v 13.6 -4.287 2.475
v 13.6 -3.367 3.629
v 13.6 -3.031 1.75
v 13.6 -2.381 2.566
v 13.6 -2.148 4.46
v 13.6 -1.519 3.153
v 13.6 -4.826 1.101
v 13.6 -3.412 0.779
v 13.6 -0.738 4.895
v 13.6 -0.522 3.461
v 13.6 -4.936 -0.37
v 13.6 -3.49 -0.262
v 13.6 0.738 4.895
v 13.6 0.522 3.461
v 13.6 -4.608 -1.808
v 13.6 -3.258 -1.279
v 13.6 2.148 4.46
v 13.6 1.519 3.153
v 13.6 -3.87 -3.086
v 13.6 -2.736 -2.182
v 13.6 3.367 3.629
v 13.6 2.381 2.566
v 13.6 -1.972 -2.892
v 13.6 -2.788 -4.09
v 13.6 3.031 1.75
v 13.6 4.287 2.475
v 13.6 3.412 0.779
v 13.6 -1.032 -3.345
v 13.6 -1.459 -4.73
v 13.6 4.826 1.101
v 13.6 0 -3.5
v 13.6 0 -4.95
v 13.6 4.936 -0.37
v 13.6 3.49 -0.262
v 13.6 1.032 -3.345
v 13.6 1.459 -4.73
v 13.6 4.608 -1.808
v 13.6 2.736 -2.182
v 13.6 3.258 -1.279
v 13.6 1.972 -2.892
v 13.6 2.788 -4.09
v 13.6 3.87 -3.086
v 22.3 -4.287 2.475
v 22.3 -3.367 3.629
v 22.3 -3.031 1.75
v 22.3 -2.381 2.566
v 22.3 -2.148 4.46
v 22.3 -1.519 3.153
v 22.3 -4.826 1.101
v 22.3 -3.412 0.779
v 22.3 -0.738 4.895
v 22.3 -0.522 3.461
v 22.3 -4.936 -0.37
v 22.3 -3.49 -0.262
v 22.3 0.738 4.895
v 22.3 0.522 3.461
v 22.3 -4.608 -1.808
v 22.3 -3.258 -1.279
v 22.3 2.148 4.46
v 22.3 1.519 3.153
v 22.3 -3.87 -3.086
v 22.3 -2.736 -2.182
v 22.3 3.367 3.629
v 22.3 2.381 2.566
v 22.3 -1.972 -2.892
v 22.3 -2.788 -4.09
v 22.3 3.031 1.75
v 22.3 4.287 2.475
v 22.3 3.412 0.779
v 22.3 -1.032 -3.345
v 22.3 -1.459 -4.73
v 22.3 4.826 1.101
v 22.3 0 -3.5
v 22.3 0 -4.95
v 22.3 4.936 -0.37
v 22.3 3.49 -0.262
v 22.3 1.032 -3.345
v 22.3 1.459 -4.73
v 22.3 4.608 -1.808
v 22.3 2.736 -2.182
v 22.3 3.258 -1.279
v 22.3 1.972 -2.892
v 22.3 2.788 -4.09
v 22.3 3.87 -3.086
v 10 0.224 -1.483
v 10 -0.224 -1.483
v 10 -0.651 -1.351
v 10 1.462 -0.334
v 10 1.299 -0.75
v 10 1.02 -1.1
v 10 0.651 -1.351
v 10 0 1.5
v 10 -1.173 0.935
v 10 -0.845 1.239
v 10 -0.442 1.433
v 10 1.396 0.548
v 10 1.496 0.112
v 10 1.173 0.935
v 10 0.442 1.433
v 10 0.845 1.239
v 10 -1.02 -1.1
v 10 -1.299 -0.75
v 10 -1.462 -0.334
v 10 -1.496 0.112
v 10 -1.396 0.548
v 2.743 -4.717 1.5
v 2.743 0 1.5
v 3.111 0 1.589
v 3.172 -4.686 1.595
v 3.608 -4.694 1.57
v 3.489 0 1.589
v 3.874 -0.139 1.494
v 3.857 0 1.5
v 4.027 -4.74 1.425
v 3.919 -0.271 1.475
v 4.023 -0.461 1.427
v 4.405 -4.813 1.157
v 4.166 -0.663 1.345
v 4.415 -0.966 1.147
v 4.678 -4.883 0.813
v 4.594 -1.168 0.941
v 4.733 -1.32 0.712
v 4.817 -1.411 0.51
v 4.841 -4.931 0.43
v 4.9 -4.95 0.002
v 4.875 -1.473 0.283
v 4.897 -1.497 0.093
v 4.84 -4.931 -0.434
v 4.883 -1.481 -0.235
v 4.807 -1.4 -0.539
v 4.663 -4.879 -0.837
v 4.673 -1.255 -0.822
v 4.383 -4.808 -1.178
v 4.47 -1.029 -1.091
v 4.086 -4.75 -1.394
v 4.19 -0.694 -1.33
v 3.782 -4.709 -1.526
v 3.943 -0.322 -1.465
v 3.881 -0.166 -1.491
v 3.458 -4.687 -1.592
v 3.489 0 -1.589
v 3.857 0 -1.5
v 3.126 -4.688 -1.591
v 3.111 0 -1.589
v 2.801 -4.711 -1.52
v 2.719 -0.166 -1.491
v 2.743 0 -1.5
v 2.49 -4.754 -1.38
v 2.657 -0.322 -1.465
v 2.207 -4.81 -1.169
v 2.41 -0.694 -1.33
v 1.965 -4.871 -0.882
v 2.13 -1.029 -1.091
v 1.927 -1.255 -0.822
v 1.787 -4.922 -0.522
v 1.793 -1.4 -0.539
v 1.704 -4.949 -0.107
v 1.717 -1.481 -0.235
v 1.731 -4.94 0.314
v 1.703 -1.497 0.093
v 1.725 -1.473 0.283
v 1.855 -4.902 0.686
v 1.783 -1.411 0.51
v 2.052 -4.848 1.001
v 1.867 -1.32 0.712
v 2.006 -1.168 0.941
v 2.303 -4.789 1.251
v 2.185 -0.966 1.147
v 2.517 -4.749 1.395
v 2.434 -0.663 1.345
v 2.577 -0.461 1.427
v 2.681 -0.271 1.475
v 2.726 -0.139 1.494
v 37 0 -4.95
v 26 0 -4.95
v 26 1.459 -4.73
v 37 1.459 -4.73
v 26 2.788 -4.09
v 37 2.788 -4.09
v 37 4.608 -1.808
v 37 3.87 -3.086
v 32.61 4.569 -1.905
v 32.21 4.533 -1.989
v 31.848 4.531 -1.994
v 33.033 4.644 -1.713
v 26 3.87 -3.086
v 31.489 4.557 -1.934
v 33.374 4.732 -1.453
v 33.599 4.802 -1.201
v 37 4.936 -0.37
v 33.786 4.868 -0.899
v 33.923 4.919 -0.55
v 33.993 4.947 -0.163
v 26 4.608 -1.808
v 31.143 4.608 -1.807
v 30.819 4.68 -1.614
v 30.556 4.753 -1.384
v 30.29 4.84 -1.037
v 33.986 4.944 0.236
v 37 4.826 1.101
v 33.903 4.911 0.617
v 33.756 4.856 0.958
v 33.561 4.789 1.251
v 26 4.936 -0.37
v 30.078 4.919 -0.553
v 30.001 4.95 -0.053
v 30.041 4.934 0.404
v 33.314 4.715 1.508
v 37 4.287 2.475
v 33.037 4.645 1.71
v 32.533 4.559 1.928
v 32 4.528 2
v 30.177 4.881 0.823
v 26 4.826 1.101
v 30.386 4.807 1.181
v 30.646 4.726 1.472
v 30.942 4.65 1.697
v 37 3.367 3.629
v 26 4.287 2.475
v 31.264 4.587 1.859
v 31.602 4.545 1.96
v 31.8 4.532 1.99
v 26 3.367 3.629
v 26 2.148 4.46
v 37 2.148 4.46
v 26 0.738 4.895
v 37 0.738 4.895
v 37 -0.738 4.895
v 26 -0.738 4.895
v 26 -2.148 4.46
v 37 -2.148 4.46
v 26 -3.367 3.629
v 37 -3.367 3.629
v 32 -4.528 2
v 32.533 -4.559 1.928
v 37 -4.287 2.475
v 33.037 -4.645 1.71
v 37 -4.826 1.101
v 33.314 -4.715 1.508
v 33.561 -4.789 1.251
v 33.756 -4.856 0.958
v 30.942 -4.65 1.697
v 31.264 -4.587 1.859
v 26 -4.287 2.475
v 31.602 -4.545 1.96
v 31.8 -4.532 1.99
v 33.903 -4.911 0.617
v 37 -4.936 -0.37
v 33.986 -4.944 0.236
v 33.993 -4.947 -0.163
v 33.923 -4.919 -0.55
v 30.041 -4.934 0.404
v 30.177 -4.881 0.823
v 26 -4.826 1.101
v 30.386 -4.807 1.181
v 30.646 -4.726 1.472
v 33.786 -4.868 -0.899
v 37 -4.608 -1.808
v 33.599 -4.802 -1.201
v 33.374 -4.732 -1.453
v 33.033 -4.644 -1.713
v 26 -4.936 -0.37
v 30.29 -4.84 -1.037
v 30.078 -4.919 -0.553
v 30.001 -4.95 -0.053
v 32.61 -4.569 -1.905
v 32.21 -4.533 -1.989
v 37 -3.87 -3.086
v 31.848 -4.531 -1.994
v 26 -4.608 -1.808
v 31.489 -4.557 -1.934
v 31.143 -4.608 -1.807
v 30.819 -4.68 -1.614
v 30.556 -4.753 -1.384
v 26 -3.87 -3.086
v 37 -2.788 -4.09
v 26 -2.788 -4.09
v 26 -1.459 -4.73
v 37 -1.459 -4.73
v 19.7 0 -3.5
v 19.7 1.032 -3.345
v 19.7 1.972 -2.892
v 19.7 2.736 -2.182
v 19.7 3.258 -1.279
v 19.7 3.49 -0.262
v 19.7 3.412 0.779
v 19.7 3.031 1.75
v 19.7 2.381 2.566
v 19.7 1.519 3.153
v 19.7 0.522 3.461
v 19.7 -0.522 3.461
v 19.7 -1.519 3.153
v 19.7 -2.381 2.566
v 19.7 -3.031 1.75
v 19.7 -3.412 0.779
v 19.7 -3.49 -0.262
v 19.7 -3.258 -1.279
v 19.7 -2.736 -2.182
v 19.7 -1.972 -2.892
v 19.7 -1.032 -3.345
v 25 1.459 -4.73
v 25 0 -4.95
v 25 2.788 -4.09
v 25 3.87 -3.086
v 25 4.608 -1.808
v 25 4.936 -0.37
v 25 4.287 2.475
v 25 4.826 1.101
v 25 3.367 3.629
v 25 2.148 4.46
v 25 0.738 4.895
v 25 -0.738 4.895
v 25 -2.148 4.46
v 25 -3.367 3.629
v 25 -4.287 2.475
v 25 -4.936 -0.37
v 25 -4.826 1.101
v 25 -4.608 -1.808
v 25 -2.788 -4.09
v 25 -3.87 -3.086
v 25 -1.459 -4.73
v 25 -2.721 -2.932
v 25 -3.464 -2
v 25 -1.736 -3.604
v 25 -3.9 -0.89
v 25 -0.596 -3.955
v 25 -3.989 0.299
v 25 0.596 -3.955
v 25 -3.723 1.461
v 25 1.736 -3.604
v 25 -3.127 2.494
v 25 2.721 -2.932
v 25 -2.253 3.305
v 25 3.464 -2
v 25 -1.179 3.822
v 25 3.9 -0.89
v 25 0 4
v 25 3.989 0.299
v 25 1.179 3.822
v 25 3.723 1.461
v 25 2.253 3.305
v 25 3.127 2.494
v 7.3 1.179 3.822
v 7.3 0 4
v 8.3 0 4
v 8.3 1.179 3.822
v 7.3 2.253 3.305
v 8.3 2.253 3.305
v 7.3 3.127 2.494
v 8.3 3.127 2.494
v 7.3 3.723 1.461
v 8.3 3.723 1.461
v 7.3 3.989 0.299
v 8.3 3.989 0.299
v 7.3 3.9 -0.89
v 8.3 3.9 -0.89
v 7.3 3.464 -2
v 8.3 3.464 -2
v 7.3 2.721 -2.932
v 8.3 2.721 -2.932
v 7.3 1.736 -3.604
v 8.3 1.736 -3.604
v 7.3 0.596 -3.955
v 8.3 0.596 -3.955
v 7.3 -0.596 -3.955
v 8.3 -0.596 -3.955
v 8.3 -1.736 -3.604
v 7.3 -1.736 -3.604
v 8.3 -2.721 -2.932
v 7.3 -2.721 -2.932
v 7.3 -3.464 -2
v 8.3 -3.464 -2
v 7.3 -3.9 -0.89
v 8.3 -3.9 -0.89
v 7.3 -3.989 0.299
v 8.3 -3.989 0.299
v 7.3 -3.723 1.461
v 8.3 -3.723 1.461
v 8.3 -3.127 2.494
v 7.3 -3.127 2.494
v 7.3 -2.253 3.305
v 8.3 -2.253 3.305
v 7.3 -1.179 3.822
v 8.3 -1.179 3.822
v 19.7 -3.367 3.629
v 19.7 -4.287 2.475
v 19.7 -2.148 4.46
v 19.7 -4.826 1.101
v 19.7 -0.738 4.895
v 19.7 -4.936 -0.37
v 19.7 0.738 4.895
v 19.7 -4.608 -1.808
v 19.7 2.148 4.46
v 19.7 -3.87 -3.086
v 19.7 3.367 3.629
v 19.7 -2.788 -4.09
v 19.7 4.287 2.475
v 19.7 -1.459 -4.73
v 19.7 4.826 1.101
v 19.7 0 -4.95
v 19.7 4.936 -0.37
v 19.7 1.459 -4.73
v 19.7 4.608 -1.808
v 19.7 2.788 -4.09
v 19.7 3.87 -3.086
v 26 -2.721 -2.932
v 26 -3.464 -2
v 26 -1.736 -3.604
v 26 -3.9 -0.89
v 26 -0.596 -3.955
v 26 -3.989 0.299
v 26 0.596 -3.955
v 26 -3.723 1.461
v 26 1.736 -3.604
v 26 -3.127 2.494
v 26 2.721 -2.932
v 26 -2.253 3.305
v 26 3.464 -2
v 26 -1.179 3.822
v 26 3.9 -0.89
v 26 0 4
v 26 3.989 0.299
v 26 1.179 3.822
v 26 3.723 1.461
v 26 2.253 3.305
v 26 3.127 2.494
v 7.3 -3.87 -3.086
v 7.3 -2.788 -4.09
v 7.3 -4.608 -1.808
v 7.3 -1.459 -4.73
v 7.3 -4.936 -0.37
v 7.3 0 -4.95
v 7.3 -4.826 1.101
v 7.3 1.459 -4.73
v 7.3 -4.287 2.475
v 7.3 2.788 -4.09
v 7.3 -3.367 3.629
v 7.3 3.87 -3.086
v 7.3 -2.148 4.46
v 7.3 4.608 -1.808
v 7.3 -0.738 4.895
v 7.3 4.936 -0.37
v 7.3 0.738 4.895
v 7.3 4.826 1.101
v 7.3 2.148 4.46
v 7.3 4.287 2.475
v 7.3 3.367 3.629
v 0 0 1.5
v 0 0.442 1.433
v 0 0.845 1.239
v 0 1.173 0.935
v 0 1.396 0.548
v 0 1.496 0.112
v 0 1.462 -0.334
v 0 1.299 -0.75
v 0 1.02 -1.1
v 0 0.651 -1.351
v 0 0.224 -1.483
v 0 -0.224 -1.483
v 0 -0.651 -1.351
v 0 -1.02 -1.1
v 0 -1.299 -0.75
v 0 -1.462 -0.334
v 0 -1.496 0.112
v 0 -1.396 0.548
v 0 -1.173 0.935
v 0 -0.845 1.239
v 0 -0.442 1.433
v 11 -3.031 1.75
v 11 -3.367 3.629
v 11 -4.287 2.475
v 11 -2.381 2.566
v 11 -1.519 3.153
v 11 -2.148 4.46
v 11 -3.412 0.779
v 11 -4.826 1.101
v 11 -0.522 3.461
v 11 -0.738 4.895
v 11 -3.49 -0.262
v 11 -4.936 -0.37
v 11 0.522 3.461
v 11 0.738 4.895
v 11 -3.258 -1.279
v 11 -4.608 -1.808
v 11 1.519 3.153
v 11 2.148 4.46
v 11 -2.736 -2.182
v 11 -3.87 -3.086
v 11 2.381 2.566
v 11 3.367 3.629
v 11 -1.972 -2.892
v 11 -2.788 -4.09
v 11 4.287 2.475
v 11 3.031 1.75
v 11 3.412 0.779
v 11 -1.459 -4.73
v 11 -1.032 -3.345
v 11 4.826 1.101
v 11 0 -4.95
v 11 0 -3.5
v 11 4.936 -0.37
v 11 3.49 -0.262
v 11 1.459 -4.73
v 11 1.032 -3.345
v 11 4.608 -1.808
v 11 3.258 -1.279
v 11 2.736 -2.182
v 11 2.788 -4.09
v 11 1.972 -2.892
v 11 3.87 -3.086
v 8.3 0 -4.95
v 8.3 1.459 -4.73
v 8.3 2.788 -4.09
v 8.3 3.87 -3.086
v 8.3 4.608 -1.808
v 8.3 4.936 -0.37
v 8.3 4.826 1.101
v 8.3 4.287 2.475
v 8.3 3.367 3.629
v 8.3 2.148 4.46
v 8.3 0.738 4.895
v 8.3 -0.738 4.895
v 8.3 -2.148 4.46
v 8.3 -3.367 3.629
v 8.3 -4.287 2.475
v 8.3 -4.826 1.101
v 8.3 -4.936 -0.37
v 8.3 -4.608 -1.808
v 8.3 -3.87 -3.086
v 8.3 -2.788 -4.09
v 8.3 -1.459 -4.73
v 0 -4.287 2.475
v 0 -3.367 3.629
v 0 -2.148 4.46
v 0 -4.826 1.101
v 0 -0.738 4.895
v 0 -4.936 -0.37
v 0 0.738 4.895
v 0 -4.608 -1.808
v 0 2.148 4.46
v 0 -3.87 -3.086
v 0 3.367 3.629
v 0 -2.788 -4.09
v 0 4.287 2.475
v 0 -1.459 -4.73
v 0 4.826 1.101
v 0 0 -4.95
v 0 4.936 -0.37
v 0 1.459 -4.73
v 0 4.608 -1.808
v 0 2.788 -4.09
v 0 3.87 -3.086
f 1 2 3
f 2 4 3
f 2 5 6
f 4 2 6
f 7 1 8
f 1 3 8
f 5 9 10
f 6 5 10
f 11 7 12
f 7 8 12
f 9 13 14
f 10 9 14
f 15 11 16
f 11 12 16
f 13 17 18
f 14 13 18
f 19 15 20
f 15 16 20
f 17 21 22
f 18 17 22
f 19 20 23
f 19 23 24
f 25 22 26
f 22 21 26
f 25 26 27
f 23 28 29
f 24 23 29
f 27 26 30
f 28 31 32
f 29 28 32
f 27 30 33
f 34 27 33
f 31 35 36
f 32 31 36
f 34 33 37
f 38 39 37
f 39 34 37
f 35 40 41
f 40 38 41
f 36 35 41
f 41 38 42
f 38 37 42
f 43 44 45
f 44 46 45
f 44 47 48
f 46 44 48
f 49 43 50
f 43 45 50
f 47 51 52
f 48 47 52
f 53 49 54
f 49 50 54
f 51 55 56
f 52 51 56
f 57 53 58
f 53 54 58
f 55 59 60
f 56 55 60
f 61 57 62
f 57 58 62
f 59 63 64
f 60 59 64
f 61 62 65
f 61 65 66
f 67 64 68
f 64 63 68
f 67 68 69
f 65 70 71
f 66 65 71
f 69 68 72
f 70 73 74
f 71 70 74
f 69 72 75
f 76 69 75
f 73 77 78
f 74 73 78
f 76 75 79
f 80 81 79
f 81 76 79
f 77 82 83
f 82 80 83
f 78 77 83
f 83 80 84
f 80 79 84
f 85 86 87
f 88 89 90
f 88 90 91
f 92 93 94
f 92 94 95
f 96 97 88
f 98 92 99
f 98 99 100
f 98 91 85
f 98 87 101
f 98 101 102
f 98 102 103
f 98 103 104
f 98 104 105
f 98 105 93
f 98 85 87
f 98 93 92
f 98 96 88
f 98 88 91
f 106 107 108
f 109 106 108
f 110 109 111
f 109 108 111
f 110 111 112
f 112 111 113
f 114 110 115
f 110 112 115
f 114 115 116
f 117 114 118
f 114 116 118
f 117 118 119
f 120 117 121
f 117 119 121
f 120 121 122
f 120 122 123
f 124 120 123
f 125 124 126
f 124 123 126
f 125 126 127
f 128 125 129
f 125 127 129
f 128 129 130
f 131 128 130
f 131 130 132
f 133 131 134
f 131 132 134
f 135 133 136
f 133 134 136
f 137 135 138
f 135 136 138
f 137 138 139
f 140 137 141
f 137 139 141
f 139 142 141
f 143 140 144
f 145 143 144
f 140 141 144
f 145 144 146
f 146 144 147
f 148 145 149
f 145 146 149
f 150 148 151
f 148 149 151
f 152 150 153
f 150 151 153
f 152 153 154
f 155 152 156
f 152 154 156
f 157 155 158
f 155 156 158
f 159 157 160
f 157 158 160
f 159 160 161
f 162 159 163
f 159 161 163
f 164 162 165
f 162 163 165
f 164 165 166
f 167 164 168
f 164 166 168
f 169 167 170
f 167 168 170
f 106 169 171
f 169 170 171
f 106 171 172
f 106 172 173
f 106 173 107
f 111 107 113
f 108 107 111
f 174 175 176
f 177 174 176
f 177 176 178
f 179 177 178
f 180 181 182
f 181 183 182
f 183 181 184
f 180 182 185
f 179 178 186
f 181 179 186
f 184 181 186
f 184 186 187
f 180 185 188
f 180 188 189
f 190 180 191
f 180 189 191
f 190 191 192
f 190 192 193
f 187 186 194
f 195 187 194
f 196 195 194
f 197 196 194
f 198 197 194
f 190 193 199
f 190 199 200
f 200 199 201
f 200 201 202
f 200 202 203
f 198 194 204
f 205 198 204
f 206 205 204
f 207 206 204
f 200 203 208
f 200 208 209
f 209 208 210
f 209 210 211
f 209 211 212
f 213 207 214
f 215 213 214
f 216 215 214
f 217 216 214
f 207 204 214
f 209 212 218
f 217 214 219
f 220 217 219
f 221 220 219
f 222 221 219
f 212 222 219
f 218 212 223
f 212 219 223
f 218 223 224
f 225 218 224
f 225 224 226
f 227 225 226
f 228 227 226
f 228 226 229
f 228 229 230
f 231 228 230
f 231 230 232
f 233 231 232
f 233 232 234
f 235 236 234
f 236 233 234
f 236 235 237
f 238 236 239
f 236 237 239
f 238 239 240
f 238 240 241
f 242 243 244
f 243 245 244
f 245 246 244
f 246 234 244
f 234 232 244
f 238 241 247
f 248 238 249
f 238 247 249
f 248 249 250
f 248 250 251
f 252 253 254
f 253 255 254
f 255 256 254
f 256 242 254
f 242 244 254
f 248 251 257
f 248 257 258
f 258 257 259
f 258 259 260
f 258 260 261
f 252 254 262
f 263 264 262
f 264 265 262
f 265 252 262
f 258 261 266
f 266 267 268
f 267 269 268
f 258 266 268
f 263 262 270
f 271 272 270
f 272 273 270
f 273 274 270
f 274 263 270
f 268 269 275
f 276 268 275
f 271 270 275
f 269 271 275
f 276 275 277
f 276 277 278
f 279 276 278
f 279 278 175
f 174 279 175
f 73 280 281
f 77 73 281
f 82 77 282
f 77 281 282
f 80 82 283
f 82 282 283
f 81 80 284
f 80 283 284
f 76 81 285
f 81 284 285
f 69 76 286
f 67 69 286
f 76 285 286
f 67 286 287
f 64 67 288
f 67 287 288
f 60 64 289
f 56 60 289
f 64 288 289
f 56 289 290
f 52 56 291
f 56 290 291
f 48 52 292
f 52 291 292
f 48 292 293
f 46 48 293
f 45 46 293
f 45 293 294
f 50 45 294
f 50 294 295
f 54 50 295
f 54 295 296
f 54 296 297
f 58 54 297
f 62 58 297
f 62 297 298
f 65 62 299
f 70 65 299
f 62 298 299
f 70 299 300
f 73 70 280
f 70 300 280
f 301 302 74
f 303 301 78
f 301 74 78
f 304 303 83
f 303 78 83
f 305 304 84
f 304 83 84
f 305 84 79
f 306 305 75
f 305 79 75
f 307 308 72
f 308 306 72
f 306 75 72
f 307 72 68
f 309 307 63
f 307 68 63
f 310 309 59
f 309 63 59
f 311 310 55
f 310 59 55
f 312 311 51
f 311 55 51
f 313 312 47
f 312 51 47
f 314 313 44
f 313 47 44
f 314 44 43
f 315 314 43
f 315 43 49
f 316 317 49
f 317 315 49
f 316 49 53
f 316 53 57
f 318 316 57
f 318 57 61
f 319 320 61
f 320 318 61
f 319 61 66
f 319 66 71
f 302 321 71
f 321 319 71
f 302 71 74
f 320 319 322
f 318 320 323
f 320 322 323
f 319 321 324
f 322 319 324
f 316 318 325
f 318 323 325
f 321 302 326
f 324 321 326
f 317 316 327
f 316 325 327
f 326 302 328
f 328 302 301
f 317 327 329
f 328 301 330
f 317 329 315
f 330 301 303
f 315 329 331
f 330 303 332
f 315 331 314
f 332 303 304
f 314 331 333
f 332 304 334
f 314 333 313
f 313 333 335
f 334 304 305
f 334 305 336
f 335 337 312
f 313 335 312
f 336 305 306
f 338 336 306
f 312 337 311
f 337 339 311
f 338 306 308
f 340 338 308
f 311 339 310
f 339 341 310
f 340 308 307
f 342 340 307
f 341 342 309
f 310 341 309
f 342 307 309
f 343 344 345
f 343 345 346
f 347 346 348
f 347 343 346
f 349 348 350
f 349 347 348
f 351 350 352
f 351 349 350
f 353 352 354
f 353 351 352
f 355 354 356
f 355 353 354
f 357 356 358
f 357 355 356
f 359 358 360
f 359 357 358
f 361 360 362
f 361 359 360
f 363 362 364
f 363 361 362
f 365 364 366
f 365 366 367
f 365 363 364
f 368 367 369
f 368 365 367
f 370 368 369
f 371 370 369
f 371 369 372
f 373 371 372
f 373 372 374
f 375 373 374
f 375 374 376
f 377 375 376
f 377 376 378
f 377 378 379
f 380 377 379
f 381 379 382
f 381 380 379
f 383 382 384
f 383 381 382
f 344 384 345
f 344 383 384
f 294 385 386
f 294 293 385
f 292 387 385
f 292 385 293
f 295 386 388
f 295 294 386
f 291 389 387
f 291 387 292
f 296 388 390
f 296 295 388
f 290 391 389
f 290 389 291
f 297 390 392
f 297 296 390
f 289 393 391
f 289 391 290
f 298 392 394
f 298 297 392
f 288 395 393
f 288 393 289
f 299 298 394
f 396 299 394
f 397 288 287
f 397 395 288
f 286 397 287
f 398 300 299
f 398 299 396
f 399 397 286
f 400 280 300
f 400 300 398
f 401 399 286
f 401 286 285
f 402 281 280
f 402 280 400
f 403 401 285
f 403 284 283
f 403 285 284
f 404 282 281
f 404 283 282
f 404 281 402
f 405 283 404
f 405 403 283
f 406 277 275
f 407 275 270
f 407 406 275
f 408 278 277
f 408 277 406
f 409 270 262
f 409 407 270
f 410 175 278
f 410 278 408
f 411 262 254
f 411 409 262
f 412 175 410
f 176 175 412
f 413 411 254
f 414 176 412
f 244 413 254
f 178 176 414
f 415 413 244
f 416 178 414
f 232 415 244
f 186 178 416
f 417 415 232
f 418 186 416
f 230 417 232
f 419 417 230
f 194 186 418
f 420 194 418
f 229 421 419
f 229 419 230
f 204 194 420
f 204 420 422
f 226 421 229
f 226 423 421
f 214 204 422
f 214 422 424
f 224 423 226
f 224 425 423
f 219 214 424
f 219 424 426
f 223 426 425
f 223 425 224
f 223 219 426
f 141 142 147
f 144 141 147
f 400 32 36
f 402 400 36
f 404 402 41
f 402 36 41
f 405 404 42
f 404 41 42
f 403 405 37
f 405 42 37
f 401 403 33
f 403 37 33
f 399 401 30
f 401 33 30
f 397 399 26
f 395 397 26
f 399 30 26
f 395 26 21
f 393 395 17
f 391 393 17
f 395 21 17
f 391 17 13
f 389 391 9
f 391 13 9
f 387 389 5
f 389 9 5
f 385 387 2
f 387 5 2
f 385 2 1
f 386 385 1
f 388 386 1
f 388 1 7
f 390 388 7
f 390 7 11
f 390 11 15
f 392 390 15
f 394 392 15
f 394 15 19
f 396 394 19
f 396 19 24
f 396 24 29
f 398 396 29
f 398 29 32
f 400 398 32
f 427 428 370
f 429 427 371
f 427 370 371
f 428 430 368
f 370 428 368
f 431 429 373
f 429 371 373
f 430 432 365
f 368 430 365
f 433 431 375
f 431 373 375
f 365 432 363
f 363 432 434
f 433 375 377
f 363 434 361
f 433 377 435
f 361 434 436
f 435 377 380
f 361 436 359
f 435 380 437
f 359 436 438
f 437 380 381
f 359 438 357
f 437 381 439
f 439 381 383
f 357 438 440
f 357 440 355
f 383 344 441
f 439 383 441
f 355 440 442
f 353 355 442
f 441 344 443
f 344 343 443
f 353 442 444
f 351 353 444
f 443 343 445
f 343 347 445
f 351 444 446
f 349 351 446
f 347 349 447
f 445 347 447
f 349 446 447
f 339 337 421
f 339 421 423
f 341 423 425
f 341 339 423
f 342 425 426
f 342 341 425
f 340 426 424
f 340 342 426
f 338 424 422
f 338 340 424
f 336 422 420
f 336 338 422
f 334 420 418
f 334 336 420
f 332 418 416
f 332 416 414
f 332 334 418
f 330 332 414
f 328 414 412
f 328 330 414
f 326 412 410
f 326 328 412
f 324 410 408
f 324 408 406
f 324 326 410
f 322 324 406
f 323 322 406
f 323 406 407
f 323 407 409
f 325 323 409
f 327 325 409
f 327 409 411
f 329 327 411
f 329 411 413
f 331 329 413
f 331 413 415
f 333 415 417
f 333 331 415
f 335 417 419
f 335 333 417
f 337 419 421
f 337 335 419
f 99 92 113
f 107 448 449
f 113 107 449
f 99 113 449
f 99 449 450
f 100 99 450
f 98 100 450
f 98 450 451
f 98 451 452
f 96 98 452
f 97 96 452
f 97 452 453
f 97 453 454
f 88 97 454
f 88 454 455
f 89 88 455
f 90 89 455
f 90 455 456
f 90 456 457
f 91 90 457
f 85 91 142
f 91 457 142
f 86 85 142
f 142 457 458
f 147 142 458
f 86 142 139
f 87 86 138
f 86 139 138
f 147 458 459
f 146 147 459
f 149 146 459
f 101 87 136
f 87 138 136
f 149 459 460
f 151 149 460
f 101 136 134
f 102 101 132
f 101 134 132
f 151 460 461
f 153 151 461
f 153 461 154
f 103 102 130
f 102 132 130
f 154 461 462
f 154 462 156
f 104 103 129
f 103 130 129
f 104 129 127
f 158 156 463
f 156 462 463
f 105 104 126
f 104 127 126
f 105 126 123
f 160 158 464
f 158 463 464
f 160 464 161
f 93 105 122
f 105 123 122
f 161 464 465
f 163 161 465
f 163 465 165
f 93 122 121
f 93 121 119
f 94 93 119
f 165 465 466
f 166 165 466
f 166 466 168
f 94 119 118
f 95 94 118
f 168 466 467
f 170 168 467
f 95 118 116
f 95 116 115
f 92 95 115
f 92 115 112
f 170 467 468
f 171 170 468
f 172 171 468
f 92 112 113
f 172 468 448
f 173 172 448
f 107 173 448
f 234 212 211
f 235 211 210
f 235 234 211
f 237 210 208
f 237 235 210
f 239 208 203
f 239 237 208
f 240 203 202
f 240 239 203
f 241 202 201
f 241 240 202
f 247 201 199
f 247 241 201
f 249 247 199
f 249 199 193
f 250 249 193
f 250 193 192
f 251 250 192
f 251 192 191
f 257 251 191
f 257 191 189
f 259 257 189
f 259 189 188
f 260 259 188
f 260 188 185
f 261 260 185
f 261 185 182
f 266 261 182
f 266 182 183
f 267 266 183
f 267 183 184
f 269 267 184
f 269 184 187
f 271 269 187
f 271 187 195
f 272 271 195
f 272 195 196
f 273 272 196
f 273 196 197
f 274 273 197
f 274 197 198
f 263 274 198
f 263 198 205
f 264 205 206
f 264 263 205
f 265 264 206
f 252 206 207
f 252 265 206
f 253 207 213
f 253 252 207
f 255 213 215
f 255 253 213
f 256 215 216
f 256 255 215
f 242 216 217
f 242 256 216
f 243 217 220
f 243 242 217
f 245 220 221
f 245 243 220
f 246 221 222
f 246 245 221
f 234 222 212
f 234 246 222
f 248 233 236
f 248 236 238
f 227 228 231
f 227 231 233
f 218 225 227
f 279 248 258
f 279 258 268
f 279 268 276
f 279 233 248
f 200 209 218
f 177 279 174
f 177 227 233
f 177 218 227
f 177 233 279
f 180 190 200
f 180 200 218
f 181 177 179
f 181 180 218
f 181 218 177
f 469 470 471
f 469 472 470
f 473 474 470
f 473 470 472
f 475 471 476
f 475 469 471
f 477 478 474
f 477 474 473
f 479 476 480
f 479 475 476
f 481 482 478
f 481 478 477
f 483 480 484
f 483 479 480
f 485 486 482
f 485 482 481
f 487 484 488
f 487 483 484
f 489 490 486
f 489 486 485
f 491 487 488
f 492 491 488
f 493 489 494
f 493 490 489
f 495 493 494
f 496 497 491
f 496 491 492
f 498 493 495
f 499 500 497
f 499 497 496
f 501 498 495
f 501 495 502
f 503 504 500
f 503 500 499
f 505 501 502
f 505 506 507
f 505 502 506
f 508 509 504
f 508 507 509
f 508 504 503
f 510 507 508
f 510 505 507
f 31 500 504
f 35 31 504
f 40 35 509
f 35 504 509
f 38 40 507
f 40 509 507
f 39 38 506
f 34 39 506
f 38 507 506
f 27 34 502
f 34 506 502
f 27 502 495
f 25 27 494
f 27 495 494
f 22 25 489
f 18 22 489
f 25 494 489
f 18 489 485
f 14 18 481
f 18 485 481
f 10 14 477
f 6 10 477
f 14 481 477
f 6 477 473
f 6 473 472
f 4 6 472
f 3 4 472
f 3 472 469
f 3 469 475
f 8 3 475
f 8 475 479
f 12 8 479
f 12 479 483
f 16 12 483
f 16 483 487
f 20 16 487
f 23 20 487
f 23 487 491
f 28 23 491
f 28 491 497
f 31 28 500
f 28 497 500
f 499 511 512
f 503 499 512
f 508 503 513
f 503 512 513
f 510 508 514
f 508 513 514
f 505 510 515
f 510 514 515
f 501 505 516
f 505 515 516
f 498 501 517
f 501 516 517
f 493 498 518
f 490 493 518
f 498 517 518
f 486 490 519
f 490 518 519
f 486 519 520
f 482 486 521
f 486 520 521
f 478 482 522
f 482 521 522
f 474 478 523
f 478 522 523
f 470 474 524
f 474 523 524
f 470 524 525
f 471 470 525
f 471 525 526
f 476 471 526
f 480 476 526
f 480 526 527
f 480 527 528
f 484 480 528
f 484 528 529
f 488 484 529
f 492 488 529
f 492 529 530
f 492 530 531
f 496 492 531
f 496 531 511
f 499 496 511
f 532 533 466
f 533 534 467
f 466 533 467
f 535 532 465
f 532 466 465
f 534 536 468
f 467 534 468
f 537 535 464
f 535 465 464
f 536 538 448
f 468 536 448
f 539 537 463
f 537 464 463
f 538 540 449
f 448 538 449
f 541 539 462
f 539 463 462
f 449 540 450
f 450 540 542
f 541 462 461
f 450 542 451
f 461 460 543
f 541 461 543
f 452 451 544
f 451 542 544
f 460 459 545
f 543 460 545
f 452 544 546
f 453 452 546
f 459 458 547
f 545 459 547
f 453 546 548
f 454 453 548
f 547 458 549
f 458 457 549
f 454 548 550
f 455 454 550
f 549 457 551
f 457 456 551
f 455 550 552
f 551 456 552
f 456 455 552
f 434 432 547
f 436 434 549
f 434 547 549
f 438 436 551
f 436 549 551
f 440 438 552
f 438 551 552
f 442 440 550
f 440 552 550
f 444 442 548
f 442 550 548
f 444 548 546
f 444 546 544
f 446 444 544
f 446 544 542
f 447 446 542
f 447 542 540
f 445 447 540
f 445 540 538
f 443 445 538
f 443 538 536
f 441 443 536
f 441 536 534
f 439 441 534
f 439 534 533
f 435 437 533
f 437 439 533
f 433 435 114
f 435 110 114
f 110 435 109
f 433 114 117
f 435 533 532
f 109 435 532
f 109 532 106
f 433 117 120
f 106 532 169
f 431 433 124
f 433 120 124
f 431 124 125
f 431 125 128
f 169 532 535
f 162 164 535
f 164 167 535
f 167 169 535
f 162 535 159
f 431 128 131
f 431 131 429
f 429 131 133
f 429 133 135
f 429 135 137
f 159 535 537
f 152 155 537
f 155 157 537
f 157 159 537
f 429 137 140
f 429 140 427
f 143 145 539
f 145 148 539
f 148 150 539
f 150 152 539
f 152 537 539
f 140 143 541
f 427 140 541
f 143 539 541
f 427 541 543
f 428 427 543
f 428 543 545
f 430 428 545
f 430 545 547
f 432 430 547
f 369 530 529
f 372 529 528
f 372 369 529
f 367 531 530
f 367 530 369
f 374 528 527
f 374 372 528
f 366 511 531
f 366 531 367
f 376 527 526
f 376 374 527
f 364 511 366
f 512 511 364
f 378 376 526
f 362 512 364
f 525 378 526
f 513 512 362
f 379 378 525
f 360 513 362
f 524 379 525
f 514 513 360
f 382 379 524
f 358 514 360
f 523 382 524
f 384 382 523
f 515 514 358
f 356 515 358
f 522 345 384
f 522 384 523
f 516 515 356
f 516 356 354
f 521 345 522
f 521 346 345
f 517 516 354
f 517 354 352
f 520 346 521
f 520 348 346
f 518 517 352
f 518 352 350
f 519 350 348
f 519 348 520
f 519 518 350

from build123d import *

# Parameters (mm, degrees)
SKETCH_1_R               = 4.95
EXTRUDE_1_DEPTH          = 37
CUT_EXTRUDE_START        = 11
SKETCH_1_3_R             = 4.95
SKETCH_1_3_R_2           = 3.5
CUT_EXTRUDE_1_DEPTH      = 2.6
CUT_EXTRUDE_START_2      = 19.7
SKETCH_1_4_R             = 4.95
SKETCH_1_4_R_2           = 3.5
CUT_EXTRUDE_2_DEPTH      = 2.6
SKETCH_2_R               = 1.5
CUT_EXTRUDE_3_DEPTH      = 10
SKETCH_3_R               = 1.6
CUT_EXTRUDE_4_DEPTH      = 38.656407157
CUT_EXTRUDE_START_3      = -7.3
SKETCH_4_R               = 4.95
SKETCH_4_R_2             = 4
CUT_EXTRUDE_5_DEPTH      = 1
CUT_EXTRUDE_START_4      = -25
SKETCH_4_2_R             = 4.95
SKETCH_4_2_R_2           = 4
CUT_EXTRUDE_6_DEPTH      = 1
CUT_EXTRUDE_7_DEPTH      = 38.656407184
CUT_EXTRUDE_7_DEPTH_BACK = 38.656407184
SKETCH_5_R               = 2


with BuildPart() as part:
    # Эскиз1 → Бобышка-Вытянуть1 (new body)
    with BuildSketch(Plane(origin=(0, 0, 0), x_dir=(0, 0, -1), z_dir=(1, 0, 0))):
        Circle(SKETCH_1_R)
    extrude(amount=EXTRUDE_1_DEPTH)

    # Эскиз1<3> → Вырез-Вытянуть1 (cut)
    with BuildSketch(Plane(origin=(0, 0, 0), x_dir=(0, 0, -1), z_dir=(1, 0, 0)).offset(CUT_EXTRUDE_START)):
        Circle(SKETCH_1_3_R)
        Circle(SKETCH_1_3_R_2, mode=Mode.SUBTRACT)
    extrude(amount=CUT_EXTRUDE_1_DEPTH, mode=Mode.SUBTRACT)

    # Эскиз1<4> → Вырез-Вытянуть2 (cut)
    with BuildSketch(Plane(origin=(0, 0, 0), x_dir=(0, 0, -1), z_dir=(1, 0, 0)).offset(CUT_EXTRUDE_START_2)):
        Circle(SKETCH_1_4_R)
        Circle(SKETCH_1_4_R_2, mode=Mode.SUBTRACT)
    extrude(amount=CUT_EXTRUDE_2_DEPTH, mode=Mode.SUBTRACT)

    # Эскиз2 → Вырез-Вытянуть3 (cut)
    with BuildSketch(Plane.ZY):
        Circle(SKETCH_2_R)
    extrude(amount=-CUT_EXTRUDE_3_DEPTH, mode=Mode.SUBTRACT)

    # Эскиз3 → Вырез-Вытянуть4 (cut, through all)
    with BuildSketch(Plane(origin=(0, 0, 0), x_dir=(1, 0, 0), z_dir=(0, 1, 0))):
        with Locations((3.3, 0)):
            Circle(SKETCH_3_R)
    extrude(amount=-CUT_EXTRUDE_4_DEPTH, mode=Mode.SUBTRACT)

    # Эскиз4 → Вырез-Вытянуть5 (cut)
    with BuildSketch(Plane.ZY.offset(CUT_EXTRUDE_START_3)):
        Circle(SKETCH_4_R)
        Circle(SKETCH_4_R_2, mode=Mode.SUBTRACT)
    extrude(amount=-CUT_EXTRUDE_5_DEPTH, mode=Mode.SUBTRACT)

    # Эскиз4<2> → Вырез-Вытянуть6 (cut)
    with BuildSketch(Plane.ZY.offset(CUT_EXTRUDE_START_4)):
        Circle(SKETCH_4_2_R)
        Circle(SKETCH_4_2_R_2, mode=Mode.SUBTRACT)
    extrude(amount=-CUT_EXTRUDE_6_DEPTH, mode=Mode.SUBTRACT)

    # Эскиз5 → Вырез-Вытянуть7 (cut, two sides: drawn at the far end of the back side and taken through both)
    with BuildSketch(Plane(origin=(0, 0, 0), x_dir=(1, 0, 0), z_dir=(0, 1, 0)).offset(-CUT_EXTRUDE_7_DEPTH_BACK)):
        with Locations((32, 0)):
            Circle(SKETCH_5_R)
    extrude(amount=CUT_EXTRUDE_7_DEPTH + CUT_EXTRUDE_7_DEPTH_BACK, mode=Mode.SUBTRACT)


solid = part.part
